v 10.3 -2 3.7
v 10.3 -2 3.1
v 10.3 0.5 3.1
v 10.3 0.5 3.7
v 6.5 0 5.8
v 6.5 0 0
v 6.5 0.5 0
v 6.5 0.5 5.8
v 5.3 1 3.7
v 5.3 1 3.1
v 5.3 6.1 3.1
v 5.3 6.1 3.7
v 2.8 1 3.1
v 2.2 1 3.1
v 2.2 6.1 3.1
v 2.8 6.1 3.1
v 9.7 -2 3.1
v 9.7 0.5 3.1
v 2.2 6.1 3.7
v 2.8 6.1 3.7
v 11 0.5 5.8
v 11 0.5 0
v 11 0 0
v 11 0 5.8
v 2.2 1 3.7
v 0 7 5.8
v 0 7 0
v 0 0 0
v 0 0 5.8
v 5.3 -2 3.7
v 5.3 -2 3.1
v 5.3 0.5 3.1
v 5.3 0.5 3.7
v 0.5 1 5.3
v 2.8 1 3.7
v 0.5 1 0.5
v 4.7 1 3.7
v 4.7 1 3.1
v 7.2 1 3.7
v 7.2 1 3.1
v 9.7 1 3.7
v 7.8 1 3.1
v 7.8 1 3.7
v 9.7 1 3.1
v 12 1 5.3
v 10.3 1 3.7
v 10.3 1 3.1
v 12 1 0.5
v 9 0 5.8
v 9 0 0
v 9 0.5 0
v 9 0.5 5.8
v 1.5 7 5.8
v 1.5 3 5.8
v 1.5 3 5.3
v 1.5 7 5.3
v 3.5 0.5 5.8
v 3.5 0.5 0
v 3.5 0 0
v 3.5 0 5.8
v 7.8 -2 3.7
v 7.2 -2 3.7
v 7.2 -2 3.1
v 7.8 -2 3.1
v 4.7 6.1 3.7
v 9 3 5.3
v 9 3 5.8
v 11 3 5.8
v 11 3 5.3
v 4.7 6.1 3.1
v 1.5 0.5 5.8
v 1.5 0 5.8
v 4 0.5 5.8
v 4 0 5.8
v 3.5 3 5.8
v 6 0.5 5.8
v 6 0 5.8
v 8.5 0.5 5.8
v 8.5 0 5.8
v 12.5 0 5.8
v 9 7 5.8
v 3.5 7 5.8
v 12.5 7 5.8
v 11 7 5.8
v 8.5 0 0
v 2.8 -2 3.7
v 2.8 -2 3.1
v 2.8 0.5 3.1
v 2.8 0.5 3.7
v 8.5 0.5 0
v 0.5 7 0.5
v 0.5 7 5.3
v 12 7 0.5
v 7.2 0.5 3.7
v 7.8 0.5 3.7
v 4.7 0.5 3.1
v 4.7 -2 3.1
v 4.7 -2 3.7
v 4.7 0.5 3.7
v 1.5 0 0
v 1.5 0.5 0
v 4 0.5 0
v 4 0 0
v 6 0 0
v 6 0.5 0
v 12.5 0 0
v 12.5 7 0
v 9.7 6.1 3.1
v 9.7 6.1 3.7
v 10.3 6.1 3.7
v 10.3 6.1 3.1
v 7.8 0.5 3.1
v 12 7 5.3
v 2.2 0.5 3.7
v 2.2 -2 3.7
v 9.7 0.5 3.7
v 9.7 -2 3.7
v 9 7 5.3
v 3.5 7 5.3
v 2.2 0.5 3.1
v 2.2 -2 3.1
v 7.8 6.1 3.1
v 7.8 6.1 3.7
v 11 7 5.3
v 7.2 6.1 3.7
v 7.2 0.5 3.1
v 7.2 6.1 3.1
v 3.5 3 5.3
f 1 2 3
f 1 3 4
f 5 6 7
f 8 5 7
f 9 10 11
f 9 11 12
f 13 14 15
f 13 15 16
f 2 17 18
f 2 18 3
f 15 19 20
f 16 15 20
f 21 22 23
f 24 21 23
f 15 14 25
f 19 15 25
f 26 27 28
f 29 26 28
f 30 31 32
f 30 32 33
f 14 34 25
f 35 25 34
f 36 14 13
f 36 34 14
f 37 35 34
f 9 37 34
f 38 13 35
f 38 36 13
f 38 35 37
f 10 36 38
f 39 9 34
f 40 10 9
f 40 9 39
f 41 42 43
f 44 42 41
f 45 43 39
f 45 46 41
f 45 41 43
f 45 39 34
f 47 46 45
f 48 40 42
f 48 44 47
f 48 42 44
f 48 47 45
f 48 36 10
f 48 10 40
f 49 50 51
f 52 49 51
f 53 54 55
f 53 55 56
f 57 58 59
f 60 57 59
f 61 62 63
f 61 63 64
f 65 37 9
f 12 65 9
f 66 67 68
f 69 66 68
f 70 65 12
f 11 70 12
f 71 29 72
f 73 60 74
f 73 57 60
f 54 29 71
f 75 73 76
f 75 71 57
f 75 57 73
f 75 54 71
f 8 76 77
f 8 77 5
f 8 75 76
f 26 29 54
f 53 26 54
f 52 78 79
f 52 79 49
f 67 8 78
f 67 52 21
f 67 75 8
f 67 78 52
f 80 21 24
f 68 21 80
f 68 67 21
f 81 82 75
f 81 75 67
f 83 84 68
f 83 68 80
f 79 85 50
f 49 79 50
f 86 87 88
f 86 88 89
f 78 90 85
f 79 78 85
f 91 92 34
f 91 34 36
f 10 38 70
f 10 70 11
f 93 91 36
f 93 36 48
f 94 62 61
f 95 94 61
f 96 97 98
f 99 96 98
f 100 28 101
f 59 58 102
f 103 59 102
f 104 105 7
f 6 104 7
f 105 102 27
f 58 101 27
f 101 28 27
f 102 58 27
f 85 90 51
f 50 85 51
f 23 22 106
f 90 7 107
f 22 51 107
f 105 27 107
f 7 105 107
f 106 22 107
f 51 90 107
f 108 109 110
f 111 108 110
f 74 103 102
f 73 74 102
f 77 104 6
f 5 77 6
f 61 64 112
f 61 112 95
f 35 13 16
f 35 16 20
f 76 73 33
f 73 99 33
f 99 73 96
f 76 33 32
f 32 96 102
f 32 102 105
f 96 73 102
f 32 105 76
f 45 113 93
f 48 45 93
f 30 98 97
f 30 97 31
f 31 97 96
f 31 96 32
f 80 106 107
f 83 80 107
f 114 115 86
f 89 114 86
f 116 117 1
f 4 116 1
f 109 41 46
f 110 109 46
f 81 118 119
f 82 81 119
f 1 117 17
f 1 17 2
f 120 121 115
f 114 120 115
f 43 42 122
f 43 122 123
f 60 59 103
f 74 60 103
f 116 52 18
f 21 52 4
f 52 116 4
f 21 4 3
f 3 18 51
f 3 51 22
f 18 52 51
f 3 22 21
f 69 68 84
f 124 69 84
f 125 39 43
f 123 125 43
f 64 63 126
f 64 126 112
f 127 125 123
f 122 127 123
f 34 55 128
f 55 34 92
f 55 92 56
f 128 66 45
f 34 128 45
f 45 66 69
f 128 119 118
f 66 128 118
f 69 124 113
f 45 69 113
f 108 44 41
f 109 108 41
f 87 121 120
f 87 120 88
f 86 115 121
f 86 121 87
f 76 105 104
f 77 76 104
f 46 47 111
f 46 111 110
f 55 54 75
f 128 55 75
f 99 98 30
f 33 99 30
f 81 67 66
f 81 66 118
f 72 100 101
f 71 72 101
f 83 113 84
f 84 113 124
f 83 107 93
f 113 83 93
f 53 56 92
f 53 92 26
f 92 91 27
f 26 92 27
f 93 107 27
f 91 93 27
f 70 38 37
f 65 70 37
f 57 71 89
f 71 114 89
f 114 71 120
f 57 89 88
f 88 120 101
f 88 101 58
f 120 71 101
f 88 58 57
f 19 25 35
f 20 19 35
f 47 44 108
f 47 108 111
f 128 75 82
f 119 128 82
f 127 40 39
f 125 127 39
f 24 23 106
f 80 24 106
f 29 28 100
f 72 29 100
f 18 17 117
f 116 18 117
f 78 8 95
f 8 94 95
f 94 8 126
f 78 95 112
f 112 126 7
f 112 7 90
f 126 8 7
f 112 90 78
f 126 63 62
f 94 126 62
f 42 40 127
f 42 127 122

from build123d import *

# Parameters (mm, degrees)
EXTRUDE_1_DEPTH      = 5.8
SKETCH_2_W           = 11.5
SKETCH_2_H           = 4.8
CUT_EXTRUDE_1_DEPTH  = 6
SKETCH_3_W           = 0.6
SKETCH_3_H           = 0.6
EXTRUDE_2_DEPTH      = 2
EXTRUDE_2_DEPTH_BACK = 6.1
SKETCH_5_W           = 2
SKETCH_5_H           = 4
CUT_EXTRUDE_2_DEPTH  = 1


with BuildPart() as part:
    # 草图1 → 凸台-拉伸1 (new body)
    with BuildSketch(Plane.XY):
        Polygon((4, 0), (4, 0.5), (6, 0.5), (6, 0), (6.5, 0), (6.5, 0.5), (8.5, 0.5), (8.5, 0), (9, 0), (9, 0.5), (11, 0.5), (11, 0), (12.5, 0), (12.5, 7), (0, 7), (0, 0), (1.5, 0), (1.5, 0.5), (3.5, 0.5), (3.5, 0), align=None)
    extrude(amount=EXTRUDE_1_DEPTH)

    # 草图2 → 切除-拉伸1 (cut)
    with BuildSketch(Plane(origin=(0, 7, 0), x_dir=(1, 0, 0), z_dir=(0, 1, 0))):
        with Locations((6.25, -2.9)):
            Rectangle(SKETCH_2_W, SKETCH_2_H)
    extrude(amount=-CUT_EXTRUDE_1_DEPTH, mode=Mode.SUBTRACT)

    # 草图3 → 凸台-拉伸2 (add, two sides)
    with BuildSketch(Plane.XZ) as extrude_2_sk:
        with Locations((5, 3.4)):
            Rectangle(SKETCH_3_W, SKETCH_3_H)
        with Locations((7.5, 3.4)):
            Rectangle(SKETCH_3_W, SKETCH_3_H)
        with Locations((2.5, 3.4)):
            Rectangle(SKETCH_3_W, SKETCH_3_H)
        with Locations((10, 3.4)):
            Rectangle(SKETCH_3_W, SKETCH_3_H)
    extrude(amount=EXTRUDE_2_DEPTH)
    extrude(extrude_2_sk.sketch, amount=-EXTRUDE_2_DEPTH_BACK)

    # 草图5 → 切除-拉伸2 (cut)
    with BuildSketch(Plane.XY.offset(5.8)):
        with Locations((2.5, 5)):
            Rectangle(SKETCH_5_W, SKETCH_5_H)
        with Locations((10, 5)):
            Rectangle(SKETCH_5_W, SKETCH_5_H)
    extrude(amount=-CUT_EXTRUDE_2_DEPTH, mode=Mode.SUBTRACT)


solid = part.part
